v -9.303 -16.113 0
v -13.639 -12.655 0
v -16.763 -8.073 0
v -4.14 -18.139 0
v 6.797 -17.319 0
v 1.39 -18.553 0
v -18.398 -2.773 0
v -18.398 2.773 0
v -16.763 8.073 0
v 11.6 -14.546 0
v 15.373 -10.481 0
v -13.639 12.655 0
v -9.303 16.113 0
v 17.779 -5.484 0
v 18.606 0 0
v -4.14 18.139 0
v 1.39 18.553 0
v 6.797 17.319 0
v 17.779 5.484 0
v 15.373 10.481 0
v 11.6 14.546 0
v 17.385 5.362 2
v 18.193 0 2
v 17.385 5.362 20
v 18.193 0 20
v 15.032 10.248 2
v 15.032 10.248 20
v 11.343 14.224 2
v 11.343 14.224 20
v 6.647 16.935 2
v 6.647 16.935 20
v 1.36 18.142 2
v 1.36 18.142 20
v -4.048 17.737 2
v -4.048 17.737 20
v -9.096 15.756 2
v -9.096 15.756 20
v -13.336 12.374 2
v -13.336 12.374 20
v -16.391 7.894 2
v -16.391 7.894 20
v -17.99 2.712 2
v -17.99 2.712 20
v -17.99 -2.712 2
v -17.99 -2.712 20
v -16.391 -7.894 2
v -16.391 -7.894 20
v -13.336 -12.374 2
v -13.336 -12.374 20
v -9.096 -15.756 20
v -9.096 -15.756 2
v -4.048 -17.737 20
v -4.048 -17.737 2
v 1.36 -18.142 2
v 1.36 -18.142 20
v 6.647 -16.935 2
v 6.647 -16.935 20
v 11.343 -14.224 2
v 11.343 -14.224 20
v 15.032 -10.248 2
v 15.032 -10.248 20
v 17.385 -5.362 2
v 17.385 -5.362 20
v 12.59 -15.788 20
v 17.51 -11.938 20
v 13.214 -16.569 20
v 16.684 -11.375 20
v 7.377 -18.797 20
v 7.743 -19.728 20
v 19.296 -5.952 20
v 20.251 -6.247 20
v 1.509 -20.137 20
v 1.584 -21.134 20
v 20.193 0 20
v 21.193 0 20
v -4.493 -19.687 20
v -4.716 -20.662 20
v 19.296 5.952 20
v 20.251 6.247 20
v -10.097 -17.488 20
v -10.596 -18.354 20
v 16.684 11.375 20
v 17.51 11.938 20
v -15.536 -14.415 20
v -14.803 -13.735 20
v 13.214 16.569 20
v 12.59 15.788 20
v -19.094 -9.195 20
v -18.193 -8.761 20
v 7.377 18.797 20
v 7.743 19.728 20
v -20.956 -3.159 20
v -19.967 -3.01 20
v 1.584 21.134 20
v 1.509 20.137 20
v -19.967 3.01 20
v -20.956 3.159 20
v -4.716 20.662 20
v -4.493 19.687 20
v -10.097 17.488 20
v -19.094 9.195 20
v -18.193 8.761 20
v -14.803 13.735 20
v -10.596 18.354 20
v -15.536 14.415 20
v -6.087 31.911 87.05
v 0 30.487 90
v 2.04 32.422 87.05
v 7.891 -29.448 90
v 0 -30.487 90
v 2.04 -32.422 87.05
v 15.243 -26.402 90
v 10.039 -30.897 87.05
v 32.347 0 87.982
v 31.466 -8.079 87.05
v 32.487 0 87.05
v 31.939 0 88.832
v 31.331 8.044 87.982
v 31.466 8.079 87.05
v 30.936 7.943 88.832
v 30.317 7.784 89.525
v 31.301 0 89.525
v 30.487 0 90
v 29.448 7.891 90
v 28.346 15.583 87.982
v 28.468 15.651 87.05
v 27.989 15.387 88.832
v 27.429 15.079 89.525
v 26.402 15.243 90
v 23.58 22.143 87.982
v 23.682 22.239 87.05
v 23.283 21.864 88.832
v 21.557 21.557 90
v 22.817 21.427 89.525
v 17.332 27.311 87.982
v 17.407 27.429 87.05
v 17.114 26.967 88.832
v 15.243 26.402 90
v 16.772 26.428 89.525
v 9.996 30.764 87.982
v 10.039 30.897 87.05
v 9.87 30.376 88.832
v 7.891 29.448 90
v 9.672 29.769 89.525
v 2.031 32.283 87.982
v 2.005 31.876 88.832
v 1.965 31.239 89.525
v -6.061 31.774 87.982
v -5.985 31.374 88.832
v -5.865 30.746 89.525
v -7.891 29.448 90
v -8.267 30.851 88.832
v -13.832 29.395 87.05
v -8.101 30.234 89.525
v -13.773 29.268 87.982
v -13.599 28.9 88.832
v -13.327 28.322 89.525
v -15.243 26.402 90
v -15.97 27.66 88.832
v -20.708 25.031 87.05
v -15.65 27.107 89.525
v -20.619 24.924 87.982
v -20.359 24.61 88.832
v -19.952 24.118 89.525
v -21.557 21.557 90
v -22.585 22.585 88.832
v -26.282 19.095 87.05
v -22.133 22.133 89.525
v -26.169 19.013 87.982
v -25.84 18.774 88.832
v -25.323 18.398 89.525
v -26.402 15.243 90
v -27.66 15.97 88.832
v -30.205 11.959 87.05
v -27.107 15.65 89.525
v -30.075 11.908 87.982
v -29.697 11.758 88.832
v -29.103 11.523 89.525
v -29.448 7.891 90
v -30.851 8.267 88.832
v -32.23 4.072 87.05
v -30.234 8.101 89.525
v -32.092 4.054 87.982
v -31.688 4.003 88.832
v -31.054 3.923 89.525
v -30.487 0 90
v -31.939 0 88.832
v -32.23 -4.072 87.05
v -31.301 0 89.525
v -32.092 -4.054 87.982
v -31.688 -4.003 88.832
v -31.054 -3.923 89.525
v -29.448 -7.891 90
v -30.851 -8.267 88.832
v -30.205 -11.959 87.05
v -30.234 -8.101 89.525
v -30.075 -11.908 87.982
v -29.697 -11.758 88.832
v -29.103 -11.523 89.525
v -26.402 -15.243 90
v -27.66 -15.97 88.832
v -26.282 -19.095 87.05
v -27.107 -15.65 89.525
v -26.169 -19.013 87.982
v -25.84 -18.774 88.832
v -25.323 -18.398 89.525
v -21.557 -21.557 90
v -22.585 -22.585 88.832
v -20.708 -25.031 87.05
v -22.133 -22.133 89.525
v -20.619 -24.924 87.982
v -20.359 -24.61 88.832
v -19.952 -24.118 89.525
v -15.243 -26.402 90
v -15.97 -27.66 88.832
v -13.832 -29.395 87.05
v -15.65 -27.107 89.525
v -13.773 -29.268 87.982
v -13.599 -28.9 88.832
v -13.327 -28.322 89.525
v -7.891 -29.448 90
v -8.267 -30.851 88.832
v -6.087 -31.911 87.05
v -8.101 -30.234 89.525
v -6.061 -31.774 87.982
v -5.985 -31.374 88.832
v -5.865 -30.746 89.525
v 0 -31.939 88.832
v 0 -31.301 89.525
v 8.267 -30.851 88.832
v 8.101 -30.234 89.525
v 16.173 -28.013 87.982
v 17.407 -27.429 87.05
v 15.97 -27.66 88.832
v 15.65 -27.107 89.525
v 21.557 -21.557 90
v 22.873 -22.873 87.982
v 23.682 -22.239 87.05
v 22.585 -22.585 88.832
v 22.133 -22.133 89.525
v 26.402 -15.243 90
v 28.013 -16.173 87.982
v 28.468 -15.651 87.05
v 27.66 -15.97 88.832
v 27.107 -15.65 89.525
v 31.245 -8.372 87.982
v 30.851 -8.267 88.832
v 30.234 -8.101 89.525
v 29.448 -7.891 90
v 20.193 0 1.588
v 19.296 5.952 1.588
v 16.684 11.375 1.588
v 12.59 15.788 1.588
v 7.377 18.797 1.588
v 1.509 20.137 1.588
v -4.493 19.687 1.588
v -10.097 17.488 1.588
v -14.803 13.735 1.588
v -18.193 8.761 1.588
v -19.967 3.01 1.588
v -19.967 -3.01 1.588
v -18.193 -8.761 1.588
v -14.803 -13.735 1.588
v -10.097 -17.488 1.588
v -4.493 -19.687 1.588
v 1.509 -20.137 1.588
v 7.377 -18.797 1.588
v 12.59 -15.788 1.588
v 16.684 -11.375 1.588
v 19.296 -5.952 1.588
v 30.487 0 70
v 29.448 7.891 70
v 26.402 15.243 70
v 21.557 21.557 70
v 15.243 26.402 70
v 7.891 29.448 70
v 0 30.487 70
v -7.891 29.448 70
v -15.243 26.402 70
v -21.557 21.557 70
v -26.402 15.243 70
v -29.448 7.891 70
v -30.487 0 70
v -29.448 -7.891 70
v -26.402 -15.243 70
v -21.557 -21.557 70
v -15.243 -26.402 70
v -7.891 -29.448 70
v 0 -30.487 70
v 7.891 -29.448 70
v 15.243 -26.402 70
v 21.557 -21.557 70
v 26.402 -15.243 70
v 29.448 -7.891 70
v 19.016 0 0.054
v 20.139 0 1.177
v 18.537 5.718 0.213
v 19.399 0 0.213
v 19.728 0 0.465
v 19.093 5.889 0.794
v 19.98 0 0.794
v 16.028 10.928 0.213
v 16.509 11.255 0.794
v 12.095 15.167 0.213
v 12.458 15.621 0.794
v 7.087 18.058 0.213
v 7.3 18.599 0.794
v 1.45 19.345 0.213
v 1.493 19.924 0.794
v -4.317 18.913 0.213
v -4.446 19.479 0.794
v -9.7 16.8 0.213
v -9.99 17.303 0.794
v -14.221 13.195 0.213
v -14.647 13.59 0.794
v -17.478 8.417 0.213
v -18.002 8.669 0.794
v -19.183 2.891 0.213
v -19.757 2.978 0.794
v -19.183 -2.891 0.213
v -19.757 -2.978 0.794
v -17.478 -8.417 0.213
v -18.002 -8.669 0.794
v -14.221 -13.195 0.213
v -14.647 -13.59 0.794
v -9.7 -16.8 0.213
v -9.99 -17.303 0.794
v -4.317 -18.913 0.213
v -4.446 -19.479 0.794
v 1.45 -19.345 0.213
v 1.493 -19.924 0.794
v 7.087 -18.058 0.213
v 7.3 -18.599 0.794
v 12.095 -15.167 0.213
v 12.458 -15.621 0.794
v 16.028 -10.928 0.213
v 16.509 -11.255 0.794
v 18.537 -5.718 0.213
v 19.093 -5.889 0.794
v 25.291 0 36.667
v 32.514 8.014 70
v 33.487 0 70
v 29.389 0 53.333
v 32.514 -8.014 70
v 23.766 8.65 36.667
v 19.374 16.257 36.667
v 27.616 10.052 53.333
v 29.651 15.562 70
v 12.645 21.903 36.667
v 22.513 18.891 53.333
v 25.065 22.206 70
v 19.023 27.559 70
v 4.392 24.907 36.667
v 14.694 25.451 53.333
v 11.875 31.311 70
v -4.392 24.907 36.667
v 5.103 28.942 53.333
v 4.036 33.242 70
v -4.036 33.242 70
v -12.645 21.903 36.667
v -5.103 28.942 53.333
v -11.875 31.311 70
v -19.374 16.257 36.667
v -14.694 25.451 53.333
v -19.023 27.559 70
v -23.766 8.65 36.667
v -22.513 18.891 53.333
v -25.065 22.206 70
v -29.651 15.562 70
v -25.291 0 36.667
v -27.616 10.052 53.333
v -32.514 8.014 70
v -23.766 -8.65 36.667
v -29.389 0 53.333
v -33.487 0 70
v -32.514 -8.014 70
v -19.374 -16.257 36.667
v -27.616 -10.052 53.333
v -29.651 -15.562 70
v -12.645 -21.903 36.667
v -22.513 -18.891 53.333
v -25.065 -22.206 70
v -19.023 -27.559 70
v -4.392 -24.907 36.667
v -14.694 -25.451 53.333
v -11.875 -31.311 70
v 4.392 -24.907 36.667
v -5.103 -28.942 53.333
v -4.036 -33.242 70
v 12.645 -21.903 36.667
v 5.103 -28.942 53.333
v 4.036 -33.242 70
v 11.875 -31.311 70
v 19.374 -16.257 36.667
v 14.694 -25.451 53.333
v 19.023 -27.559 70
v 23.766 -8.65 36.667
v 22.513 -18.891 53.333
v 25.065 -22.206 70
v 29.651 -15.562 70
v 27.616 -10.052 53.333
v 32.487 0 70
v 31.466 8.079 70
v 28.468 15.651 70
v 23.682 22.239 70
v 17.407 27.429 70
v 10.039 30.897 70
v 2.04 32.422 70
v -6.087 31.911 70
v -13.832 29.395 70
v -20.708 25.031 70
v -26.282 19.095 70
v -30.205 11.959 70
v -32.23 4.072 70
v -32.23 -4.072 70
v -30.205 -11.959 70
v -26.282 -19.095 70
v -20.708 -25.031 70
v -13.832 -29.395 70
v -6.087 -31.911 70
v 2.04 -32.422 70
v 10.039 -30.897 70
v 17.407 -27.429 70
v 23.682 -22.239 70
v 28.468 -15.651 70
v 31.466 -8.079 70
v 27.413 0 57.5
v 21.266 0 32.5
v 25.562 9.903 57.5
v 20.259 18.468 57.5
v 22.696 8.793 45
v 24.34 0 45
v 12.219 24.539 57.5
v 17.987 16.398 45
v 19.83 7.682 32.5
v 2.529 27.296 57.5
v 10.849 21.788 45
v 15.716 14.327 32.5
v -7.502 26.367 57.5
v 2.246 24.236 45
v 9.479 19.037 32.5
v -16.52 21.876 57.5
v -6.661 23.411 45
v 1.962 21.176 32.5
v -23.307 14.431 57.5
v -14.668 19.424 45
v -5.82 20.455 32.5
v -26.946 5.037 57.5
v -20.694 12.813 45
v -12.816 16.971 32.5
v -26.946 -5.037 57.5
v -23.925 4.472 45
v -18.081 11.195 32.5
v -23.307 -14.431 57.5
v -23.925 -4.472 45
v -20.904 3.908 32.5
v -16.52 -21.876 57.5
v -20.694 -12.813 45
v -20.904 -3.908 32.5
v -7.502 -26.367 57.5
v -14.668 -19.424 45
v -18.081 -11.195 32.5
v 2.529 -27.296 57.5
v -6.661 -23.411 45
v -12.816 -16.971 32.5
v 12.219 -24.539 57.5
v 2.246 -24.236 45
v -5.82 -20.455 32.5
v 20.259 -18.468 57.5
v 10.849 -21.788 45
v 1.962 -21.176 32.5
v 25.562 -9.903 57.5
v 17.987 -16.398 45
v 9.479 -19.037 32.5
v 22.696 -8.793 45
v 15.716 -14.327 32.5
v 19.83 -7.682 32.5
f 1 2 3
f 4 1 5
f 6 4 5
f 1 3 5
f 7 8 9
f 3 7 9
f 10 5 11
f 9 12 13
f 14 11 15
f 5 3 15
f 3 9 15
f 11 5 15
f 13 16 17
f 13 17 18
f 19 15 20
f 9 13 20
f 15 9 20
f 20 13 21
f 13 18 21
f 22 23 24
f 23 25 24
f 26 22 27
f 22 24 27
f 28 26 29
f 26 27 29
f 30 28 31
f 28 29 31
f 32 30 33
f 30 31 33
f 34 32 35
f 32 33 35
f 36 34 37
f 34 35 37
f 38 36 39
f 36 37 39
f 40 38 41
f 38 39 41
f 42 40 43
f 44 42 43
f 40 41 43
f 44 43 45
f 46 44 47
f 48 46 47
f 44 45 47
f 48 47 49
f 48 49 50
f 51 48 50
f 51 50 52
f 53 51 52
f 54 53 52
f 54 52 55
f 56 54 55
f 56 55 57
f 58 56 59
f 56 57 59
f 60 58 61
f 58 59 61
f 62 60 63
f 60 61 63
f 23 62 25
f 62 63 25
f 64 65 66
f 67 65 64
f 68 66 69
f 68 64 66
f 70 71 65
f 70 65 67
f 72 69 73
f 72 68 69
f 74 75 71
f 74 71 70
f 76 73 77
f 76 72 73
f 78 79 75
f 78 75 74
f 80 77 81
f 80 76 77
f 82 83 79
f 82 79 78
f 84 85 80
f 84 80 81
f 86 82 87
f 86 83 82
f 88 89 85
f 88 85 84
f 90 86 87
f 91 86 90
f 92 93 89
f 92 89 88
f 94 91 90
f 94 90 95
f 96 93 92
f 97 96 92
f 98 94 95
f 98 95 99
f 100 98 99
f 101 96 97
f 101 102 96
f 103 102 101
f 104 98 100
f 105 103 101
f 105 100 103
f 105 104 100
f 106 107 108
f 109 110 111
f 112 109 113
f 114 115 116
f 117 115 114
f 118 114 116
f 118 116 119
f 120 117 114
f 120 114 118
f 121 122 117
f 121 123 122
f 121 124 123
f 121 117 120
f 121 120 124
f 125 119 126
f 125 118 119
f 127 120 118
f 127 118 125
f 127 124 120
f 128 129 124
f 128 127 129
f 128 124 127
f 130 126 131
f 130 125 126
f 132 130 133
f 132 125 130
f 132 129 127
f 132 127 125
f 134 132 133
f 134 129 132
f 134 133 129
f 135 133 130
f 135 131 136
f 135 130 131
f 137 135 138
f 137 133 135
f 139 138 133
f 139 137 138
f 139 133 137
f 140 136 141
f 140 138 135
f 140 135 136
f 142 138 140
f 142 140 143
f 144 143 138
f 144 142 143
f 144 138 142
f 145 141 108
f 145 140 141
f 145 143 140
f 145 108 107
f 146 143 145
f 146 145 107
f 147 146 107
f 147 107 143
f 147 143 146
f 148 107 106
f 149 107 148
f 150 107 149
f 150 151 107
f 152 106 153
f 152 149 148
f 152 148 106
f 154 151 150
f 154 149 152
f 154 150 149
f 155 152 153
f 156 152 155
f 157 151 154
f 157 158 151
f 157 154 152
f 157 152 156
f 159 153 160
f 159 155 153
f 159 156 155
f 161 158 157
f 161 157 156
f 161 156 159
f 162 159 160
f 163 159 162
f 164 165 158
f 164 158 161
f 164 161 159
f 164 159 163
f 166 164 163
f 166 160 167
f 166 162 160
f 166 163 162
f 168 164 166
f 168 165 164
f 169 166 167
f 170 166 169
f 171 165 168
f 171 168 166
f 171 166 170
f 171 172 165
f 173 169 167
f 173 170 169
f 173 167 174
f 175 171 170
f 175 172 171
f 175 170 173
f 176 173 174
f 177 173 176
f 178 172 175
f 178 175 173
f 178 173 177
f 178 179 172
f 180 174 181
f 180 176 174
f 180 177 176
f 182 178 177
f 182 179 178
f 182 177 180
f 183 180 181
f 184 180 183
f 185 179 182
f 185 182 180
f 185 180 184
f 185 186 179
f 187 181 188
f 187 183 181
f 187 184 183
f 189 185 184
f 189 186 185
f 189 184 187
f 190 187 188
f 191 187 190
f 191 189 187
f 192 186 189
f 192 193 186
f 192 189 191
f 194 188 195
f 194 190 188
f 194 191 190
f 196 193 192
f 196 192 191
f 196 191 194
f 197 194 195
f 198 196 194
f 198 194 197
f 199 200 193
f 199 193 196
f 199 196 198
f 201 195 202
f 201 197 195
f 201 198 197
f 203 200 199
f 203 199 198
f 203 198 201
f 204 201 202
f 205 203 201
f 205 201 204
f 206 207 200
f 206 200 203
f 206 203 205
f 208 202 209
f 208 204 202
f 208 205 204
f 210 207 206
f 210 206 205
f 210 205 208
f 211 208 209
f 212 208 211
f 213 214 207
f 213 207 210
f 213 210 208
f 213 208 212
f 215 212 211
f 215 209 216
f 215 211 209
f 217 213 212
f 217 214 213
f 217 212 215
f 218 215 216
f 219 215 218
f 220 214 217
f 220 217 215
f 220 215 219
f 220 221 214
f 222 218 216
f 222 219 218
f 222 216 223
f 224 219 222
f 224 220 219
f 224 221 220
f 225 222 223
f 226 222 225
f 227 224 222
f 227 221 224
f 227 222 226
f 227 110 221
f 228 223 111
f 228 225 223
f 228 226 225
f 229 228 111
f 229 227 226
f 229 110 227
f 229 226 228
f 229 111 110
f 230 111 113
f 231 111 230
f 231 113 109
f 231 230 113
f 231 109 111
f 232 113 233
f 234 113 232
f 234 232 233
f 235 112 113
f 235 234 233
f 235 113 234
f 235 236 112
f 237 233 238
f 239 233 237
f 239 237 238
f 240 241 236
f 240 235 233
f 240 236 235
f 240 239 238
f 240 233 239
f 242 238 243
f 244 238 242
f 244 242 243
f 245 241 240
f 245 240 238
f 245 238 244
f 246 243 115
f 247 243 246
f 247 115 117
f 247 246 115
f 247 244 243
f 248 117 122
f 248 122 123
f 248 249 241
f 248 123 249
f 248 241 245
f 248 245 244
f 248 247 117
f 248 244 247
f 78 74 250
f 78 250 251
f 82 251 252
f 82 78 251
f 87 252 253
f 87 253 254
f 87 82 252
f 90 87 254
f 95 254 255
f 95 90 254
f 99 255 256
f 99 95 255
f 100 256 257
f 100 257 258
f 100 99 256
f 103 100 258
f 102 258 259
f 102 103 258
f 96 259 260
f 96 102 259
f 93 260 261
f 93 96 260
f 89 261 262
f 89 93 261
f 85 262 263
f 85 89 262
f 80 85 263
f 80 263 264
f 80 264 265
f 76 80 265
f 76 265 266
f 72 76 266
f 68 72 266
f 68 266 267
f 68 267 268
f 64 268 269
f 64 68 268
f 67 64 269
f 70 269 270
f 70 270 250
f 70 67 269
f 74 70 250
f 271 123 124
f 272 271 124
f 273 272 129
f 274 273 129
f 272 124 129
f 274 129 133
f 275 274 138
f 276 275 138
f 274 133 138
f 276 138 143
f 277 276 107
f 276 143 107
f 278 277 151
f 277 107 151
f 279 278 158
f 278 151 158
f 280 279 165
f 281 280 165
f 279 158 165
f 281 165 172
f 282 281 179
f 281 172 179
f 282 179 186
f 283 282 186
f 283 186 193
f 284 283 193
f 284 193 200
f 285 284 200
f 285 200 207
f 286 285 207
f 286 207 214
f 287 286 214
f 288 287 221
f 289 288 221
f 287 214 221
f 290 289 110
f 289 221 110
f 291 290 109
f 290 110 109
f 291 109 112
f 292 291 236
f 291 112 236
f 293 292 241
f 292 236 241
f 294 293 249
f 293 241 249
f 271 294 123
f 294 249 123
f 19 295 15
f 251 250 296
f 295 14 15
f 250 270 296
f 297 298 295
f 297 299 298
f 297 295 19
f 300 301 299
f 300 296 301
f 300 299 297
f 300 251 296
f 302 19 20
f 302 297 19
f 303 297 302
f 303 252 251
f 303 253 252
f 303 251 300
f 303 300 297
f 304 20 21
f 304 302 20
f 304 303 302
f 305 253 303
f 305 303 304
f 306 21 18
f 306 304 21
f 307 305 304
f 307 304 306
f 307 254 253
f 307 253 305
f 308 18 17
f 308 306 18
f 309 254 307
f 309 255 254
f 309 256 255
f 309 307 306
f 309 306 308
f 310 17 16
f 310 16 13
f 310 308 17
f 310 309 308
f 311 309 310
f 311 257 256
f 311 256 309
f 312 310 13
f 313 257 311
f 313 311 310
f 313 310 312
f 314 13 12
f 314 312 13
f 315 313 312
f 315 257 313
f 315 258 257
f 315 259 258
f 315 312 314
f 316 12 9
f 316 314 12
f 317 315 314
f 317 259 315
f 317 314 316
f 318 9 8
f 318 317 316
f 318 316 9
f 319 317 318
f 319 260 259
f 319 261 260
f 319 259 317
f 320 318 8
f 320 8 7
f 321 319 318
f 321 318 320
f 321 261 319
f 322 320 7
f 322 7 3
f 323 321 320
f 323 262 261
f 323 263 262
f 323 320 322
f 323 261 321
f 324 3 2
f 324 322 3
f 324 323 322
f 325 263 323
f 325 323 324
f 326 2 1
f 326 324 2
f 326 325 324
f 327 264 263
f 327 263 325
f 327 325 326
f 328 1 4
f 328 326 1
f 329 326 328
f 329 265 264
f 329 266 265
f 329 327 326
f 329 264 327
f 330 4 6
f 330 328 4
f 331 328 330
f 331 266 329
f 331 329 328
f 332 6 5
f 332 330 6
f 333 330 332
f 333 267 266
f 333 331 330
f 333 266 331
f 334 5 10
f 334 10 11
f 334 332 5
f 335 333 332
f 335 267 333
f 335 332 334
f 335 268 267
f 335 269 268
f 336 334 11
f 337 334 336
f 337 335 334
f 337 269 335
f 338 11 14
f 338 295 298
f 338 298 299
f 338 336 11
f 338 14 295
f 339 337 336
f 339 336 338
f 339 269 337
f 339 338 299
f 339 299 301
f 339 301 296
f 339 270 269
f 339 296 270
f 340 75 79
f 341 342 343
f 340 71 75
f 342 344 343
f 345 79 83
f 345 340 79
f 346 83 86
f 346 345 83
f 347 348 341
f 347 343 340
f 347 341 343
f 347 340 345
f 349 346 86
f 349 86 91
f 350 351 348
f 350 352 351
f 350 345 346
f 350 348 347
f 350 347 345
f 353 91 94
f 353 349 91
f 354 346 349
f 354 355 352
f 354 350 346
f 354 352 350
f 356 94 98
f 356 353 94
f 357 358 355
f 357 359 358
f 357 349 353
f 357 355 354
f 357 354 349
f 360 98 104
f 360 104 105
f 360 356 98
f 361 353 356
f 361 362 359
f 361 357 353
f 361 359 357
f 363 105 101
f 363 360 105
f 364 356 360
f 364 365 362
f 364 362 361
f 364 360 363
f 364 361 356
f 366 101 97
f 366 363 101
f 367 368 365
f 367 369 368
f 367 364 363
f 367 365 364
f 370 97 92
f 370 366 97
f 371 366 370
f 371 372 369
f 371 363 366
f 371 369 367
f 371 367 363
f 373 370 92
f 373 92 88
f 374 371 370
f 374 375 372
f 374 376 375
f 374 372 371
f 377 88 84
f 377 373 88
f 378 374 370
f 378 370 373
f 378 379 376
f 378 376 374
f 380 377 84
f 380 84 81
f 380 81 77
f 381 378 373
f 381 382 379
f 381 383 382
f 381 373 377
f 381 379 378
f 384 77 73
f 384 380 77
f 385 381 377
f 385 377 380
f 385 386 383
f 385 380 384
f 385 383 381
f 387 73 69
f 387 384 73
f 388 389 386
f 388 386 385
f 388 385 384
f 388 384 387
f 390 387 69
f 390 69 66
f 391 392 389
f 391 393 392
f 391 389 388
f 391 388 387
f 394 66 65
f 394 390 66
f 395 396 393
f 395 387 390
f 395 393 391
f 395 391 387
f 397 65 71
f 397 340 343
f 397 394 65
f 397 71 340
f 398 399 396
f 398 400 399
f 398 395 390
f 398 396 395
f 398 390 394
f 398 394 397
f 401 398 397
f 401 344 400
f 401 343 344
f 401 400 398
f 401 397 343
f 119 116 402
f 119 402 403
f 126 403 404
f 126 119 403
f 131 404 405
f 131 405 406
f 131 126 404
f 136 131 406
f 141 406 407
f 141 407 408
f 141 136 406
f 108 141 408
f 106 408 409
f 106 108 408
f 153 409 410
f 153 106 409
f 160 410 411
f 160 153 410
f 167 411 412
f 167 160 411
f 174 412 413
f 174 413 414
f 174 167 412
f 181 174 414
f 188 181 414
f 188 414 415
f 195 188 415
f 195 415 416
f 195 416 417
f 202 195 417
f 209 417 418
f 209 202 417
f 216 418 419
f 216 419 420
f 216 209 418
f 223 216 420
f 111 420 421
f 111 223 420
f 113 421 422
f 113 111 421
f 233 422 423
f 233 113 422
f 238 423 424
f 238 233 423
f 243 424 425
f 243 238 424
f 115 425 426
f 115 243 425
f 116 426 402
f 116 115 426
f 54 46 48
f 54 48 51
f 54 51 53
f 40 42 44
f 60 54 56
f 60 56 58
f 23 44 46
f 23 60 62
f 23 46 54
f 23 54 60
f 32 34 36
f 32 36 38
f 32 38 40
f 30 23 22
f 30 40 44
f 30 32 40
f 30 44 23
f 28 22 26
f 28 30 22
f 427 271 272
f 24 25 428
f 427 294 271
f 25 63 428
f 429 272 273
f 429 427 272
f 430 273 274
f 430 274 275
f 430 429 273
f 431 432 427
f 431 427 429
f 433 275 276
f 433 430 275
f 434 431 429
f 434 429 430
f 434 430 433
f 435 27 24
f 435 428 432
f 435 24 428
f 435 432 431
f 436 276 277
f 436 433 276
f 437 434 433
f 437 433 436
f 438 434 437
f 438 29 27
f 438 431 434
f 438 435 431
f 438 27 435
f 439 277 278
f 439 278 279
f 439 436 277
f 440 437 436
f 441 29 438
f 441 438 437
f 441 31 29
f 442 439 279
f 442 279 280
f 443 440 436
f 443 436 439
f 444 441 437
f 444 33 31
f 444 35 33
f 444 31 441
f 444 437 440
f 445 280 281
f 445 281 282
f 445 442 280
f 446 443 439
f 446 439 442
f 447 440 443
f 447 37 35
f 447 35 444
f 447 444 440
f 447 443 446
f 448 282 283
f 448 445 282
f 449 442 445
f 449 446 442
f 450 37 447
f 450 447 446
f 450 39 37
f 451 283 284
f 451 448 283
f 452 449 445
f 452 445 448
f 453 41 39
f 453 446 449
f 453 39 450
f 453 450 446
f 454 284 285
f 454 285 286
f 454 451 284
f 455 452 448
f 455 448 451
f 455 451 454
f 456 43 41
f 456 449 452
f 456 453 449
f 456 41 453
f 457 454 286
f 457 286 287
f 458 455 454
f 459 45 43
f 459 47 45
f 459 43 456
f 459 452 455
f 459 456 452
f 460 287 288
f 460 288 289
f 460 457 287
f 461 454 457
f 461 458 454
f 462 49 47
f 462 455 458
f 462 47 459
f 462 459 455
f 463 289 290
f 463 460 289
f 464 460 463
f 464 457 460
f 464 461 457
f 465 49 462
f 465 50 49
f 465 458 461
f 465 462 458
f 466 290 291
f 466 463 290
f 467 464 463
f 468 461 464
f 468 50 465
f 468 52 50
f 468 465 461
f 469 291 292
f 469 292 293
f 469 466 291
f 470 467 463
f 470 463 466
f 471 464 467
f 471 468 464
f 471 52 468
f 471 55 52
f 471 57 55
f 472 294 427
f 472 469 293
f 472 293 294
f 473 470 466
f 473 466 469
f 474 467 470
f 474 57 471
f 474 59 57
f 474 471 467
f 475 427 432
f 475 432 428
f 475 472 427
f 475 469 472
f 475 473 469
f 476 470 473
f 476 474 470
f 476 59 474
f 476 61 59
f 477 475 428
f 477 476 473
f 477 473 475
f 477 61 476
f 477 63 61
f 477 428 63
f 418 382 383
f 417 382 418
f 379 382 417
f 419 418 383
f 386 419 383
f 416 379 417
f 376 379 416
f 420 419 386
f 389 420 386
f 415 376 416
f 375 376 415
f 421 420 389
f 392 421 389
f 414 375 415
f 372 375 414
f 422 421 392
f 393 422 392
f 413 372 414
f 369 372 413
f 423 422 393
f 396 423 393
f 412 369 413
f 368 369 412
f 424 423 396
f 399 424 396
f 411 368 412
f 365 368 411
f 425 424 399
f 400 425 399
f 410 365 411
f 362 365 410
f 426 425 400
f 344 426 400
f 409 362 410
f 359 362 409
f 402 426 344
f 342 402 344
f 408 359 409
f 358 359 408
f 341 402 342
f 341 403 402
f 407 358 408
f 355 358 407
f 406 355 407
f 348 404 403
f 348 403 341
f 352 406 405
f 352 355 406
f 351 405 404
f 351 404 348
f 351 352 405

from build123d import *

# Parameters (mm, degrees)
F0_W     = 2.00000108
F0_H     = 20.0000108
F2_R     = 18.19299892
F3_DEPTH = 2.00000108
F4_R     = 1.5875


# Not quite as in the source:
# - a fillet or chamfer that OpenCascade refuses, or shapes differently, is made with other operations: its cross-section is extruded or revolved along the edge and cut away or added


with BuildPart() as f1:
    # F0 (on Front) → F1 (revolve)
    with BuildSketch(Plane.XZ):
        with Locations((19.19299946, 10.0000054)):
            Rectangle(F0_W, F0_H)
        Polygon((30.48659892, 69.9999108), (18.19299892, 20.0000108), (20.193, 20.0000108), (21.19299292, 20.0000108), (33.48659292, 69.9999108), (32.4866, 69.9999108), align=None)
        with Locations((31.48659946, 79.9999162)):
            Rectangle(F0_W, F0_H)
    revolve(axis=Axis((0, 0, 12.2811223036), (0, 0, 1)))

    # F2 (on Top) → F3 (join)
    with BuildSketch(Plane.XY):
        Circle(F2_R)
    extrude(amount=F3_DEPTH)

    # F4
    f4_edges = [f1.edges().sort_by_distance(p)[0] for p in [
        (-20.193, 0, 0),
    ]]
    fillet(f4_edges, radius=F4_R)

    # F5: fillet of radius 3.175 on 1 edges, made by hand

    # F5_s1 → F5_t2 (revolve, cut)
    with BuildSketch(Plane.XZ):
        with BuildLine():
            ThreePointArc((32.4866, 87.050344929), (31.9394552634, 88.8321983782), (30.48659892, 89.9999216))
            Line((30.48659892, 89.9999216), (32.4866, 89.9999216))
            Line((32.4866, 89.9999216), (32.4866, 87.050344929))
        make_face()
    revolve(axis=Axis((0, 0, 89.9999216), (0, 0, 1)), mode=Mode.SUBTRACT)


solid = f1.part
